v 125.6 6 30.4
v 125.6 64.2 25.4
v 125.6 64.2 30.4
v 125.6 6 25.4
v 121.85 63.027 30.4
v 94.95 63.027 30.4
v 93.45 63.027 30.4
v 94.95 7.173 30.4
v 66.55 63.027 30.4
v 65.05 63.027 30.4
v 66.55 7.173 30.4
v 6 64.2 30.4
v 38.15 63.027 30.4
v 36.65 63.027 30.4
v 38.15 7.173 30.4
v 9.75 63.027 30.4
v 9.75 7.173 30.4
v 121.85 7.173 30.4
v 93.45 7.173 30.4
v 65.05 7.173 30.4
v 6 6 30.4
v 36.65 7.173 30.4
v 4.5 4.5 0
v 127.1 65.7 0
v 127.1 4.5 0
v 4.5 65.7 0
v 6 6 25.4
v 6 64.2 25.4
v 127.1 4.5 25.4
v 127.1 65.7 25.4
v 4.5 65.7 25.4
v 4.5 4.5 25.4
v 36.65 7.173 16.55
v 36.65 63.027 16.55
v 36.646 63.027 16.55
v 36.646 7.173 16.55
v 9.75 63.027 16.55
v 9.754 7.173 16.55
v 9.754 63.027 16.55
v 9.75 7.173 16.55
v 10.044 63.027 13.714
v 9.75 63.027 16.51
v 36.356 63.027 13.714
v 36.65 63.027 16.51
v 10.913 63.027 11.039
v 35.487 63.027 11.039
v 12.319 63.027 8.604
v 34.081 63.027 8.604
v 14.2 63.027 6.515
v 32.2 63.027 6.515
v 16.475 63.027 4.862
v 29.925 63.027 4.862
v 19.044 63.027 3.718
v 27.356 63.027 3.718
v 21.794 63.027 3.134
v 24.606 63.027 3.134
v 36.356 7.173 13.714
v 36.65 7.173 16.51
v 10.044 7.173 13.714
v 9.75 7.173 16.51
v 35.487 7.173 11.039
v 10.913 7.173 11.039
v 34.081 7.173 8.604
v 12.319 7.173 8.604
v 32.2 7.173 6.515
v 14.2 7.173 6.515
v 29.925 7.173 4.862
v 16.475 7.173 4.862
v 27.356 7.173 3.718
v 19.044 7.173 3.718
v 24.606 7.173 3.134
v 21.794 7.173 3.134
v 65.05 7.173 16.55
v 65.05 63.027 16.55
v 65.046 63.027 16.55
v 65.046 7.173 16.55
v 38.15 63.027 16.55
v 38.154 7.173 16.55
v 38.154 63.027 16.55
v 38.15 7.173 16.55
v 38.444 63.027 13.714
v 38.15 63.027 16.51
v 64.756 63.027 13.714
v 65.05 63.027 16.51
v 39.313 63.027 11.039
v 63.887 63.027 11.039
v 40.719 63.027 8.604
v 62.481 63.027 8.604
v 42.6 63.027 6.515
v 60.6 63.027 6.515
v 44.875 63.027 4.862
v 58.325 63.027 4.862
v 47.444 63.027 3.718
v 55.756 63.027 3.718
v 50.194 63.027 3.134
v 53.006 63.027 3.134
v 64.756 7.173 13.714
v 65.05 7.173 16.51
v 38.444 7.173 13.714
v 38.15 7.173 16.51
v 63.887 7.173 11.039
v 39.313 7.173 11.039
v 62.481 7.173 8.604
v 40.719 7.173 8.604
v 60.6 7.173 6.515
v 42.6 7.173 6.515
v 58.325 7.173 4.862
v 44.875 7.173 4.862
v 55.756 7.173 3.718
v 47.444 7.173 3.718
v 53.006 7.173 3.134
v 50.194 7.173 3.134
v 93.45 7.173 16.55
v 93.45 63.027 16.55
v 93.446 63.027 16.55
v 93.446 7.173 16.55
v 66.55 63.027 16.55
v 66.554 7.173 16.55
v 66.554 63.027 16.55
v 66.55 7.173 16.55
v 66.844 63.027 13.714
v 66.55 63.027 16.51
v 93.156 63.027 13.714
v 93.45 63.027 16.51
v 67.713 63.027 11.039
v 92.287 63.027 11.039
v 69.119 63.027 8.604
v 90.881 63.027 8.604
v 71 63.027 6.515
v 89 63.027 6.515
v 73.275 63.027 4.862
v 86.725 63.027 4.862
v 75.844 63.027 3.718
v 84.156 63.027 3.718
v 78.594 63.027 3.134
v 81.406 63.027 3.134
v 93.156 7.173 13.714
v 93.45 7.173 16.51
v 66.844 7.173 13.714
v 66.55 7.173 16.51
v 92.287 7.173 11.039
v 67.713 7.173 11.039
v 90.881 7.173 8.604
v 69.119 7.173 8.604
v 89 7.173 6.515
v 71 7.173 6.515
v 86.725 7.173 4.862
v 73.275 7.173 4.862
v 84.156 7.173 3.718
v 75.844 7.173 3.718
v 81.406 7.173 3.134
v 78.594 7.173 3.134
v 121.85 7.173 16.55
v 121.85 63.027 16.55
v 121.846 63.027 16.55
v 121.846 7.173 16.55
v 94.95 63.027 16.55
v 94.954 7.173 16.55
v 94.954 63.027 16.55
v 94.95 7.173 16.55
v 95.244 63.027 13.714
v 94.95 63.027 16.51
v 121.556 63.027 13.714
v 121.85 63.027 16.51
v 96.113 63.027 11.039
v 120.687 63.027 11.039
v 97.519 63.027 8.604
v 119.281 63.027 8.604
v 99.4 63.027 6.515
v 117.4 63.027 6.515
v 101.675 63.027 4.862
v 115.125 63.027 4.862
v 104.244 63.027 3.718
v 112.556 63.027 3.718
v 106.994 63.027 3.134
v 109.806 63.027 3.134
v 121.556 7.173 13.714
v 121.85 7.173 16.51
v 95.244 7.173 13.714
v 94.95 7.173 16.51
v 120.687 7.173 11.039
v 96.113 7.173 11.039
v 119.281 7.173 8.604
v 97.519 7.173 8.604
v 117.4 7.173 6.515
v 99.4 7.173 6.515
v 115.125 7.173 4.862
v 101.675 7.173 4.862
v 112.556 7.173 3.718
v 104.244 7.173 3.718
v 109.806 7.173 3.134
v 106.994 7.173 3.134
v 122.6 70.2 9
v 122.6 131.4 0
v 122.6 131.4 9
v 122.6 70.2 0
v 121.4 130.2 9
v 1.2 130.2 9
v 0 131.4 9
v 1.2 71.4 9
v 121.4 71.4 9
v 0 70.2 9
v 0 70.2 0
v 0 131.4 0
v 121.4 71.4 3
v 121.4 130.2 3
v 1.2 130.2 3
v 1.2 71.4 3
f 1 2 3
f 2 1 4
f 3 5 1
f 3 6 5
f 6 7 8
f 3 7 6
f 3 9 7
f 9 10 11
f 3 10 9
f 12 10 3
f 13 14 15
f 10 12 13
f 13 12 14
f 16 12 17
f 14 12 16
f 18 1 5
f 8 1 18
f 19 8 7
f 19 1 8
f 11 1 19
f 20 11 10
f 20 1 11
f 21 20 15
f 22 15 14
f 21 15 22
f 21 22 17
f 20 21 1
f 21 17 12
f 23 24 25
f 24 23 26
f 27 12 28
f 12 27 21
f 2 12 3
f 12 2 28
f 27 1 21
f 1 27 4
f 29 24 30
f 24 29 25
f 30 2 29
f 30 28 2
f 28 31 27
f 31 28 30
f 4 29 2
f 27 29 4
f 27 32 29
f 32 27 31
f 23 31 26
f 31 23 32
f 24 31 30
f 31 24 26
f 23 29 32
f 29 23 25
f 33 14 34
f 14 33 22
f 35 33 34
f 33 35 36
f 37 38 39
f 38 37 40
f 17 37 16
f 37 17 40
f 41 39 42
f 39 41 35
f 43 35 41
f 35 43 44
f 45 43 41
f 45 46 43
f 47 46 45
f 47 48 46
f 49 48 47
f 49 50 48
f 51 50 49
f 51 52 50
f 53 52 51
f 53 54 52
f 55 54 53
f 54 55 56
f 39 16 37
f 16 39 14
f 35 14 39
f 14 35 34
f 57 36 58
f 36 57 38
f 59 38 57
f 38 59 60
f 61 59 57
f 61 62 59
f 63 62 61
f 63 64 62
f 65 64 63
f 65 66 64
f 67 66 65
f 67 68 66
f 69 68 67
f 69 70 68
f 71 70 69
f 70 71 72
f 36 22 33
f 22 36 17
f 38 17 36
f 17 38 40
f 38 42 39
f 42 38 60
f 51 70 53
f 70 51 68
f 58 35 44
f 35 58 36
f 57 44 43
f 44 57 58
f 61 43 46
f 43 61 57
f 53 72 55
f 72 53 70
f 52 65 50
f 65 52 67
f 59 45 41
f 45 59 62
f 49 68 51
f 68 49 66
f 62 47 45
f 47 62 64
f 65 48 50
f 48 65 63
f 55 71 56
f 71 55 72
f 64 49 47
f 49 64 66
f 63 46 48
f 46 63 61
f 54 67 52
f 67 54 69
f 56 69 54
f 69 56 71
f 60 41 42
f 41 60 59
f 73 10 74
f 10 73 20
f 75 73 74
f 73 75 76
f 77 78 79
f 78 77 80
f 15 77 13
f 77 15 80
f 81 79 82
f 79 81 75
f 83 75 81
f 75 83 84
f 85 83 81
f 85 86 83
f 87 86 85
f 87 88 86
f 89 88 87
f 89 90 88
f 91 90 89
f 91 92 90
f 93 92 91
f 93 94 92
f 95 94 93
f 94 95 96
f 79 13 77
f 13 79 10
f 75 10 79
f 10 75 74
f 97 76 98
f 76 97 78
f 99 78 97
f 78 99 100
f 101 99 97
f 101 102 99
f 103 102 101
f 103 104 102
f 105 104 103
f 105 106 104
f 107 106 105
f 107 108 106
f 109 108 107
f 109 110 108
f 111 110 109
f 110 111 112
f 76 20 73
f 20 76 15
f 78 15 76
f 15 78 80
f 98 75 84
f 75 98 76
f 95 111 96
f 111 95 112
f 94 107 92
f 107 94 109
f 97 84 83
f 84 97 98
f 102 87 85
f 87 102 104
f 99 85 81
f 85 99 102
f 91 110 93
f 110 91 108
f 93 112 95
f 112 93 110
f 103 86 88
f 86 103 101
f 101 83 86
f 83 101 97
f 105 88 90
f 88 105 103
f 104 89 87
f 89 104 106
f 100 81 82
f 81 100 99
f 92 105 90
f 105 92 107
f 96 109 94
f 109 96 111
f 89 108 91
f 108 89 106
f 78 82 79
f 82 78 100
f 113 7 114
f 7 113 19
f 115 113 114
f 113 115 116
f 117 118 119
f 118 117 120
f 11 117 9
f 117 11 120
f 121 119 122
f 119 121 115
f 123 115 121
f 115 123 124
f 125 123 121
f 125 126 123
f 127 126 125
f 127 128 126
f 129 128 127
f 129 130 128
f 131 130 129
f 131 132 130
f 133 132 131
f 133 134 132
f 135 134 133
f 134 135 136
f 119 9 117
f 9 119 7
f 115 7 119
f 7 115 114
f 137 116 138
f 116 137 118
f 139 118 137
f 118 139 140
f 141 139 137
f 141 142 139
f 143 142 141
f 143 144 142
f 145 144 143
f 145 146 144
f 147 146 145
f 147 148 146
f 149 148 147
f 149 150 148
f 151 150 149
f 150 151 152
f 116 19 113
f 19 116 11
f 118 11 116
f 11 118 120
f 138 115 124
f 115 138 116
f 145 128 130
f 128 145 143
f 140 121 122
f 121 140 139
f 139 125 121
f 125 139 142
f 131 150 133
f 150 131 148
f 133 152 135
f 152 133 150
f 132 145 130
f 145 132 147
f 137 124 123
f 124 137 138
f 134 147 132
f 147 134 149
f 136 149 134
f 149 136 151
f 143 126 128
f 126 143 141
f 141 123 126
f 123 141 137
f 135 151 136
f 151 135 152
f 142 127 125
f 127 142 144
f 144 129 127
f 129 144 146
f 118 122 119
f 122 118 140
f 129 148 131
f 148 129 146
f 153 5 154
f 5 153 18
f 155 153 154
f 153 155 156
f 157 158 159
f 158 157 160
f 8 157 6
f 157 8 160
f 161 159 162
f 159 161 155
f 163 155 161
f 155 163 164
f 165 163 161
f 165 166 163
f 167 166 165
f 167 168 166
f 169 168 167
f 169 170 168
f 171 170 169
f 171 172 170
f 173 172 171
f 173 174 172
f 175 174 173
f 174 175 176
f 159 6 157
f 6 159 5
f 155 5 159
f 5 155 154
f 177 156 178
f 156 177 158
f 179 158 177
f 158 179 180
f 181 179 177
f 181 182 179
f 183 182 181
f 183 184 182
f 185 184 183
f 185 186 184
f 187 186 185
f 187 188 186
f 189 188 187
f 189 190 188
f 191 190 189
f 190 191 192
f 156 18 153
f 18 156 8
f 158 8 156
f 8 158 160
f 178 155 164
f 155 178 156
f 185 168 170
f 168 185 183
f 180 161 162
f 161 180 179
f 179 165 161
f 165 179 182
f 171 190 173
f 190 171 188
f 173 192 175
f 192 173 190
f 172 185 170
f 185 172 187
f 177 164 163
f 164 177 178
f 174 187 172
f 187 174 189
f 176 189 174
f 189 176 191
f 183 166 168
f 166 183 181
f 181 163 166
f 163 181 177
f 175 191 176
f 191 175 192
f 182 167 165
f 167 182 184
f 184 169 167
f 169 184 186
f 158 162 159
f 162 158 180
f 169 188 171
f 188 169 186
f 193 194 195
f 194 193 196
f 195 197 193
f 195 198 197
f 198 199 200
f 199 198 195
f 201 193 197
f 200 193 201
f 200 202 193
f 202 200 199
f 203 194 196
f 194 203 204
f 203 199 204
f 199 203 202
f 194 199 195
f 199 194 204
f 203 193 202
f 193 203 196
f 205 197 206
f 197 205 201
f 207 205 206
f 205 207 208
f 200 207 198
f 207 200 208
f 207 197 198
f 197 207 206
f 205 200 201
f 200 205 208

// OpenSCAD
diameter = 25.4;
diameter_slop = 3;
height = 4;
height_slop = 0.35;
ncolumns = 4;
nrows = 12;
extra_height = 5;
extra_depth = 6;
extra_width = 6;

module box_hole(i)
{
	hole_width = diameter + diameter_slop / 2;
	translate(v = [ extra_width / 2 + 
			i * (diameter + diameter_slop) + diameter_slop / 4 +
			hole_width / 2,
			(nrows * (height + height_slop) + extra_depth) / 2,
			0]) { 
		translate(v = [0, 0, diameter * 1.25])
		cube(size = [hole_width,
				1.07 * nrows * (height + height_slop),
				diameter / 2 + extra_height], center = true);
		translate(v = [0, 0, 1.8 * diameter / 2])
		rotate(a = 90, v = [1, 0, 0])
			cylinder(h = 1.07 * nrows * (height + height_slop),
				r1 = (diameter + diameter_slop / 2) / 2,
				r2 = (diameter + diameter_slop / 2) / 2,
				// r2 = (diameter + diameter_slop / 2) / 2,
				center = true);
	}
}
module box_bottom_solid()
{
	translate(v = [extra_width, extra_depth, 0])
	difference() {
		union() {
			cube(size = [ ncolumns * (diameter + diameter_slop) + extra_width,
					nrows * (height + height_slop) + extra_depth,
					diameter + extra_height],
					center = false);
			translate(v = [-extra_width/4, -extra_depth/4, 0])
			cube(size = [ ncolumns * (diameter + diameter_slop) + extra_width * 1.5,
					nrows * (height + height_slop) + extra_depth * 1.5,
					diameter],
					center = false);
		}
		translate(v = [0, 0, -0.25 * diameter]) {
			box_hole(0);
			box_hole(1);
			box_hole(2);
			box_hole(3);
		}
	}
}

module box_lid()
{
	difference() {
		cube(size = [ ncolumns * (diameter + diameter_slop) + extra_width * 1.5,
				nrows * (height + height_slop) + extra_depth * 1.5,
				extra_height * 1.8],
				center = false);
		translate(v = [extra_width / 5, extra_depth / 5, 3]) {
			cube(size = [ ncolumns * (diameter + diameter_slop) + extra_width * 1.5 - 2 * extra_width / 5,
				nrows * (height + height_slop) + extra_depth * 1.5 - 2 * extra_depth / 5,
				extra_height * 1.5],
				center = false);
		}
	}
}



box_bottom_solid();

translate (v = [0, nrows * (height + height_slop) + extra_depth * 3, 0])
	box_lid();
